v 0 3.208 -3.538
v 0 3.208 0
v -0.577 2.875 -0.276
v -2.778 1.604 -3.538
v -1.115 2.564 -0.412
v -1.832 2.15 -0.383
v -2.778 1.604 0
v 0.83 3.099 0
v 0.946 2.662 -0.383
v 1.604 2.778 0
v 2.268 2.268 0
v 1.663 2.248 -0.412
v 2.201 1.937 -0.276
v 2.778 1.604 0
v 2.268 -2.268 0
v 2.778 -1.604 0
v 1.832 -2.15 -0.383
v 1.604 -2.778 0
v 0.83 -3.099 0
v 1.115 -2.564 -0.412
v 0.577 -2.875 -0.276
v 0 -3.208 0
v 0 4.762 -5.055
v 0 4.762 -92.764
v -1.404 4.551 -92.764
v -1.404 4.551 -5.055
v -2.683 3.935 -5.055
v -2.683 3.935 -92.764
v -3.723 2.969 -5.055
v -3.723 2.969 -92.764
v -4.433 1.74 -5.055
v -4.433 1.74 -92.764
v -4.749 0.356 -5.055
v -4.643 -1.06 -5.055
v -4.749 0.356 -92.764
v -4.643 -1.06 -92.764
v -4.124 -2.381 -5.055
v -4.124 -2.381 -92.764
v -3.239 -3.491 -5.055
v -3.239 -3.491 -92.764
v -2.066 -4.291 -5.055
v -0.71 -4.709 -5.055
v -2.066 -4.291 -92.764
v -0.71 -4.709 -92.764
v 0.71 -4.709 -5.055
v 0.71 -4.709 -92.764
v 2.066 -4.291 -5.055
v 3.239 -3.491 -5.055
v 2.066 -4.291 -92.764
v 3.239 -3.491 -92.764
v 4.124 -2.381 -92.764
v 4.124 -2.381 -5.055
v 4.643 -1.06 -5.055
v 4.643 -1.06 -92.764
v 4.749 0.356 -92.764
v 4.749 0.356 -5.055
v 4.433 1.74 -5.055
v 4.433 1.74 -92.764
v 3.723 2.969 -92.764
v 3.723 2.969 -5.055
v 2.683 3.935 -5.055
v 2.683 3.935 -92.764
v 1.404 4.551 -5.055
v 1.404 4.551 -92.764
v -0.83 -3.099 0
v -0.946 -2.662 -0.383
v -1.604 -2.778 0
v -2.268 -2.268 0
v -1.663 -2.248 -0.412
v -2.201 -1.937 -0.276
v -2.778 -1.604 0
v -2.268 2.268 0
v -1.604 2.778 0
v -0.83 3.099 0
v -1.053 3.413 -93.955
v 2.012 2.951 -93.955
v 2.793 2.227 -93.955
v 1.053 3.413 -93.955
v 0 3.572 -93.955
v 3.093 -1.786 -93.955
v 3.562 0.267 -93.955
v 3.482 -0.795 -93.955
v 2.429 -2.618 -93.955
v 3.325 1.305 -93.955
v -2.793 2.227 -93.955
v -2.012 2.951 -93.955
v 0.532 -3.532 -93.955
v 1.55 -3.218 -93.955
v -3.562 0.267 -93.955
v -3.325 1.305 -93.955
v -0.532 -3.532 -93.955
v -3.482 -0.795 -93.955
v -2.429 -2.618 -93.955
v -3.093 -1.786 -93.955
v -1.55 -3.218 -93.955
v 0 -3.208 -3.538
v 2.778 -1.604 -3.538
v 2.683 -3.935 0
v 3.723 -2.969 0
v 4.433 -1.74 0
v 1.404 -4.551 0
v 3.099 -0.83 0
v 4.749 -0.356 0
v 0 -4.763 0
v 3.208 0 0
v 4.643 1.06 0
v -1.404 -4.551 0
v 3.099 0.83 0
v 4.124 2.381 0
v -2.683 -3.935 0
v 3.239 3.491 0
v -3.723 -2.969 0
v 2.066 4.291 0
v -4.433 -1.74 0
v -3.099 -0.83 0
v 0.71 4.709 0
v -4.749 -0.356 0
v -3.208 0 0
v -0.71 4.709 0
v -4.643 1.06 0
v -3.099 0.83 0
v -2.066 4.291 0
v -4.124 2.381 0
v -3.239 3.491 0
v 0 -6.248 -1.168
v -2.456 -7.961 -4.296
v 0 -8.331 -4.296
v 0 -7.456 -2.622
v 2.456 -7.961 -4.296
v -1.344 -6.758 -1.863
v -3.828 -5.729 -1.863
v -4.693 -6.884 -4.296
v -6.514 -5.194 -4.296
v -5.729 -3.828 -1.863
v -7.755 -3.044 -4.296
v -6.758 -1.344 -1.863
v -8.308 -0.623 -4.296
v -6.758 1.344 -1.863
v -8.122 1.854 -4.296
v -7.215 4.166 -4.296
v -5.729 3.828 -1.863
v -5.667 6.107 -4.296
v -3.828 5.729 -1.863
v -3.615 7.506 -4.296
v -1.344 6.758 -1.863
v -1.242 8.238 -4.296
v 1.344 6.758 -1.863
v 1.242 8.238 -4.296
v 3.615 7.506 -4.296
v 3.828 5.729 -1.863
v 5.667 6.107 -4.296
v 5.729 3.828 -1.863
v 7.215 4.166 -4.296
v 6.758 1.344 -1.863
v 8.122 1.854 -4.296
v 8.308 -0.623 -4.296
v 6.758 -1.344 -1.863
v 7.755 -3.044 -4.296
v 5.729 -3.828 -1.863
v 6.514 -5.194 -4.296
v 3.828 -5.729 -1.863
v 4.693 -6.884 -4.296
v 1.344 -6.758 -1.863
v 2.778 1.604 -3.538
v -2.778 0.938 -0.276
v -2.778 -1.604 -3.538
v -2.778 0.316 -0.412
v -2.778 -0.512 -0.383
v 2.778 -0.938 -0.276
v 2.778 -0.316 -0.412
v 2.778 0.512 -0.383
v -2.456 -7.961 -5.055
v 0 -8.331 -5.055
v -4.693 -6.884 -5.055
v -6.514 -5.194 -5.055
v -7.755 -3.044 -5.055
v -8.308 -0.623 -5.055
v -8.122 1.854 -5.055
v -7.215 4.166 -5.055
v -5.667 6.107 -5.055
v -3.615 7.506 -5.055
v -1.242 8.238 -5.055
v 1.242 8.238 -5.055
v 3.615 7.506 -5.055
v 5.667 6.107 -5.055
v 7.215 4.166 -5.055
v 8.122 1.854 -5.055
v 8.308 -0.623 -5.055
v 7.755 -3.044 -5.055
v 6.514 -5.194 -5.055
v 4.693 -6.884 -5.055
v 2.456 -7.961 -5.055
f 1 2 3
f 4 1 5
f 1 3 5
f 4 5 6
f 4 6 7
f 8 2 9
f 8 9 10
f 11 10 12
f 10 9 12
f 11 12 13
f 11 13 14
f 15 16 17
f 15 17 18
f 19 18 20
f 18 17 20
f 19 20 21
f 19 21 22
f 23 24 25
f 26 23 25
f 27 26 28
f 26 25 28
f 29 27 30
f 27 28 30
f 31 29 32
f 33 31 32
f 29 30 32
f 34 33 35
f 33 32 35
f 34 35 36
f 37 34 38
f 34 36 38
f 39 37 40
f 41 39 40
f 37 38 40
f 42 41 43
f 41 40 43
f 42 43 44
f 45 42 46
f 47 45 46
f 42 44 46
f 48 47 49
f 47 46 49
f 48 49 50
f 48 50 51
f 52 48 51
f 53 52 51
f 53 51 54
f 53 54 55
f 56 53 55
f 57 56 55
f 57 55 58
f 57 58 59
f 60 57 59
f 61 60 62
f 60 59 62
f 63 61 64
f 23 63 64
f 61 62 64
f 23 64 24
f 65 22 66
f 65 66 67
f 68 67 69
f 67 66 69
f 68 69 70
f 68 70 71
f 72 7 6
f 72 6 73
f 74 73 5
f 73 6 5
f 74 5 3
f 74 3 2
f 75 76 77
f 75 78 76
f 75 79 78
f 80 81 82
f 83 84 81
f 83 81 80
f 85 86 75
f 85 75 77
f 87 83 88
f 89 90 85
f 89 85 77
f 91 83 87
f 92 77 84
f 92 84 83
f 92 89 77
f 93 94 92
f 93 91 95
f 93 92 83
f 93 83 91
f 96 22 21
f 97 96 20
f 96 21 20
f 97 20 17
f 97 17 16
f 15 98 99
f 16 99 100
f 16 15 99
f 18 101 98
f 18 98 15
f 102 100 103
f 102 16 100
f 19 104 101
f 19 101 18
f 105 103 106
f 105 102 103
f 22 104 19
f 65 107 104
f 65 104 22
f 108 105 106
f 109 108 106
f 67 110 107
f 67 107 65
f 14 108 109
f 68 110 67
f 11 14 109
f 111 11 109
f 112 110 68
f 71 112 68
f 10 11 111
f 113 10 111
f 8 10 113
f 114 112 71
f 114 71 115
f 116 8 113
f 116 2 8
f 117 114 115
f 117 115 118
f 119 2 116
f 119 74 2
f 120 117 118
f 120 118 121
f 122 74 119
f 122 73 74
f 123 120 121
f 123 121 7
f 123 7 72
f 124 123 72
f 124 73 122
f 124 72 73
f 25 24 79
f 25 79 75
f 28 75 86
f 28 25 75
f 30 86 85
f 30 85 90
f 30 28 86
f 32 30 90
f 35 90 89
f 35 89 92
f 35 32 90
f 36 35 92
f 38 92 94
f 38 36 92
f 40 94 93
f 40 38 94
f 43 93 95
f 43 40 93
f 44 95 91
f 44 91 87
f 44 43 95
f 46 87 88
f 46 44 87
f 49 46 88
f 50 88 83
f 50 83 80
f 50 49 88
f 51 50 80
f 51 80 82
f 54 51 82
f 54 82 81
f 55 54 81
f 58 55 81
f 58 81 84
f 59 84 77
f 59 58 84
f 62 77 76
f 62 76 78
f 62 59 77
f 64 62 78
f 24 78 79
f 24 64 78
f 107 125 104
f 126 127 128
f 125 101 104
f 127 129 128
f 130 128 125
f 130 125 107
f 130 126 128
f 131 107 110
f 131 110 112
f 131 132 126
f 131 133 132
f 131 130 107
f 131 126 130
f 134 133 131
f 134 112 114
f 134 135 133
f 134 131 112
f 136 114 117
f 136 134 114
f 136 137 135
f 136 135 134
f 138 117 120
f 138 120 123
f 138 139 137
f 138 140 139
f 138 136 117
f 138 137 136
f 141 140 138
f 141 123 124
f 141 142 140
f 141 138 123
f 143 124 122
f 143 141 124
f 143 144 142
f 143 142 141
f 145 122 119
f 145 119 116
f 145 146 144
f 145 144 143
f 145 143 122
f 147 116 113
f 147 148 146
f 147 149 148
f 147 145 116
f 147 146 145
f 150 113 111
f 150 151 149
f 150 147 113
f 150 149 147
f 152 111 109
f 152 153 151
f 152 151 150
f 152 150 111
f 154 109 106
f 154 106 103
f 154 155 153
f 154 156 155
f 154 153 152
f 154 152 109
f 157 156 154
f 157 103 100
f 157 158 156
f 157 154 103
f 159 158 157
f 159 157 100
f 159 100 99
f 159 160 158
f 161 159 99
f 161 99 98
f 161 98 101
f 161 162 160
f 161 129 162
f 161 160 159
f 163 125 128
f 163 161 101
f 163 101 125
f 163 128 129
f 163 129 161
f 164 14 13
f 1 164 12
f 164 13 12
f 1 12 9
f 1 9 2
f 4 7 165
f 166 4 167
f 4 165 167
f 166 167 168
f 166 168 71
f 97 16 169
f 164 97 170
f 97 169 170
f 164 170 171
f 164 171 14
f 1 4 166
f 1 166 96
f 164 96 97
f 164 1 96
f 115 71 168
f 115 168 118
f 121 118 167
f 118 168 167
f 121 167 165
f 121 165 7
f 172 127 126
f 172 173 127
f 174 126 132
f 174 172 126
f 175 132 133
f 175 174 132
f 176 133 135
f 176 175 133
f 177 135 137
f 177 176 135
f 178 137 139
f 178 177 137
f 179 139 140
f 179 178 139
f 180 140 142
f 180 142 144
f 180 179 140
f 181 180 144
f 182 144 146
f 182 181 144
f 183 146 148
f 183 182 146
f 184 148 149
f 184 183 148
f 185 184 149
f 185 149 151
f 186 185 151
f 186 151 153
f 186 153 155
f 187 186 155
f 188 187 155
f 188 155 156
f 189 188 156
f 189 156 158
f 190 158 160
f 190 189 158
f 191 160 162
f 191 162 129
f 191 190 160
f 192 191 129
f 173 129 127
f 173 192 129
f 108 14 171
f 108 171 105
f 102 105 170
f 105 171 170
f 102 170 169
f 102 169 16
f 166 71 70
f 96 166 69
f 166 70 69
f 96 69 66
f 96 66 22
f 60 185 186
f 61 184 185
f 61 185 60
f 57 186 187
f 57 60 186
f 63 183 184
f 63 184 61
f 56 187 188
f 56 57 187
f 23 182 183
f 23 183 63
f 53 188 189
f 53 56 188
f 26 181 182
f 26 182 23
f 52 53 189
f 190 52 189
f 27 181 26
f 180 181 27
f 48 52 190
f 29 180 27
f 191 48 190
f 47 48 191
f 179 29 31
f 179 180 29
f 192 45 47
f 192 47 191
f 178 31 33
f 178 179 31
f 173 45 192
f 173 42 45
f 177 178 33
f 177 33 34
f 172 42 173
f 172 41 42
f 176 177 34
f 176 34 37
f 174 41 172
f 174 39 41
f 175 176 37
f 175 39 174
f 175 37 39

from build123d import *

# Parameters (mm, degrees)
SKETCH1_W          = 88.9
SKETCH1_H          = 4.7625
CHAMFER1_SIZE      = 1.190625
CUT_EXTRUDE2_DEPTH = 3.53822


with BuildPart() as part:
    # Sketch1 → Revolve1 (revolve)
    with BuildSketch(Plane(origin=(0, 0, 0), x_dir=(0, 0, -1), z_dir=(1, 0, 0))):
        with Locations((49.5046, 2.38125)):
            Rectangle(SKETCH1_W, SKETCH1_H)
    revolve(axis=Axis((0, 0, -93.9546), (0, 0, 1)))

    # Chamfer1
    chamfer1_edges = [part.edges().sort_by_distance(p)[0] for p in [
        (0, -4.7625, -93.9546),
    ]]
    chamfer(chamfer1_edges, length=CHAMFER1_SIZE)

    # Sketch7 → Revolve2 (revolve)
    with BuildSketch(Plane(origin=(0, 0, 0), x_dir=(0, 0, -1), z_dir=(1, 0, 0))):
        with BuildLine():
            Line((4.29641, 8.3312), (5.0546, 8.3312))
            Line((5.0546, 8.3312), (5.0546, 0))
            Line((5.0546, 0), (0, 0))
            Line((0, 0), (0, 4.7625))
            ThreePointArc((0, 4.7625), (1.862939611, 6.890285164), (4.29641, 8.3312))
        make_face()
    revolve(axis=Axis((0, 0, 0), (0, 0, -1)))

    # Sketch5 → Cut-Extrude2 (cut)
    with BuildSketch(Plane.XY):
        Polygon((2.778125, -1.603951217), (2.778125, 1.603951217), (0, 3.207902433), (-2.778125, 1.603951217), (-2.778125, -1.603951217), (0, -3.207902433), align=None)
    extrude(amount=-CUT_EXTRUDE2_DEPTH, mode=Mode.SUBTRACT)

    # Cut-Extrude3 cone 1 section (through the dimple's axis) → Cut-Extrude3 (revolve, cut)
    with BuildSketch(Plane(origin=(0, 0, 0), x_dir=(0, -1, 0), z_dir=(1, 0, 0))):
        Polygon((0, 0), (3.207902433, 0), (0, 3.207902433), align=None)
    revolve(axis=Axis((0, 0, 0), (0, 0, -1)), mode=Mode.SUBTRACT)


solid = part.part
